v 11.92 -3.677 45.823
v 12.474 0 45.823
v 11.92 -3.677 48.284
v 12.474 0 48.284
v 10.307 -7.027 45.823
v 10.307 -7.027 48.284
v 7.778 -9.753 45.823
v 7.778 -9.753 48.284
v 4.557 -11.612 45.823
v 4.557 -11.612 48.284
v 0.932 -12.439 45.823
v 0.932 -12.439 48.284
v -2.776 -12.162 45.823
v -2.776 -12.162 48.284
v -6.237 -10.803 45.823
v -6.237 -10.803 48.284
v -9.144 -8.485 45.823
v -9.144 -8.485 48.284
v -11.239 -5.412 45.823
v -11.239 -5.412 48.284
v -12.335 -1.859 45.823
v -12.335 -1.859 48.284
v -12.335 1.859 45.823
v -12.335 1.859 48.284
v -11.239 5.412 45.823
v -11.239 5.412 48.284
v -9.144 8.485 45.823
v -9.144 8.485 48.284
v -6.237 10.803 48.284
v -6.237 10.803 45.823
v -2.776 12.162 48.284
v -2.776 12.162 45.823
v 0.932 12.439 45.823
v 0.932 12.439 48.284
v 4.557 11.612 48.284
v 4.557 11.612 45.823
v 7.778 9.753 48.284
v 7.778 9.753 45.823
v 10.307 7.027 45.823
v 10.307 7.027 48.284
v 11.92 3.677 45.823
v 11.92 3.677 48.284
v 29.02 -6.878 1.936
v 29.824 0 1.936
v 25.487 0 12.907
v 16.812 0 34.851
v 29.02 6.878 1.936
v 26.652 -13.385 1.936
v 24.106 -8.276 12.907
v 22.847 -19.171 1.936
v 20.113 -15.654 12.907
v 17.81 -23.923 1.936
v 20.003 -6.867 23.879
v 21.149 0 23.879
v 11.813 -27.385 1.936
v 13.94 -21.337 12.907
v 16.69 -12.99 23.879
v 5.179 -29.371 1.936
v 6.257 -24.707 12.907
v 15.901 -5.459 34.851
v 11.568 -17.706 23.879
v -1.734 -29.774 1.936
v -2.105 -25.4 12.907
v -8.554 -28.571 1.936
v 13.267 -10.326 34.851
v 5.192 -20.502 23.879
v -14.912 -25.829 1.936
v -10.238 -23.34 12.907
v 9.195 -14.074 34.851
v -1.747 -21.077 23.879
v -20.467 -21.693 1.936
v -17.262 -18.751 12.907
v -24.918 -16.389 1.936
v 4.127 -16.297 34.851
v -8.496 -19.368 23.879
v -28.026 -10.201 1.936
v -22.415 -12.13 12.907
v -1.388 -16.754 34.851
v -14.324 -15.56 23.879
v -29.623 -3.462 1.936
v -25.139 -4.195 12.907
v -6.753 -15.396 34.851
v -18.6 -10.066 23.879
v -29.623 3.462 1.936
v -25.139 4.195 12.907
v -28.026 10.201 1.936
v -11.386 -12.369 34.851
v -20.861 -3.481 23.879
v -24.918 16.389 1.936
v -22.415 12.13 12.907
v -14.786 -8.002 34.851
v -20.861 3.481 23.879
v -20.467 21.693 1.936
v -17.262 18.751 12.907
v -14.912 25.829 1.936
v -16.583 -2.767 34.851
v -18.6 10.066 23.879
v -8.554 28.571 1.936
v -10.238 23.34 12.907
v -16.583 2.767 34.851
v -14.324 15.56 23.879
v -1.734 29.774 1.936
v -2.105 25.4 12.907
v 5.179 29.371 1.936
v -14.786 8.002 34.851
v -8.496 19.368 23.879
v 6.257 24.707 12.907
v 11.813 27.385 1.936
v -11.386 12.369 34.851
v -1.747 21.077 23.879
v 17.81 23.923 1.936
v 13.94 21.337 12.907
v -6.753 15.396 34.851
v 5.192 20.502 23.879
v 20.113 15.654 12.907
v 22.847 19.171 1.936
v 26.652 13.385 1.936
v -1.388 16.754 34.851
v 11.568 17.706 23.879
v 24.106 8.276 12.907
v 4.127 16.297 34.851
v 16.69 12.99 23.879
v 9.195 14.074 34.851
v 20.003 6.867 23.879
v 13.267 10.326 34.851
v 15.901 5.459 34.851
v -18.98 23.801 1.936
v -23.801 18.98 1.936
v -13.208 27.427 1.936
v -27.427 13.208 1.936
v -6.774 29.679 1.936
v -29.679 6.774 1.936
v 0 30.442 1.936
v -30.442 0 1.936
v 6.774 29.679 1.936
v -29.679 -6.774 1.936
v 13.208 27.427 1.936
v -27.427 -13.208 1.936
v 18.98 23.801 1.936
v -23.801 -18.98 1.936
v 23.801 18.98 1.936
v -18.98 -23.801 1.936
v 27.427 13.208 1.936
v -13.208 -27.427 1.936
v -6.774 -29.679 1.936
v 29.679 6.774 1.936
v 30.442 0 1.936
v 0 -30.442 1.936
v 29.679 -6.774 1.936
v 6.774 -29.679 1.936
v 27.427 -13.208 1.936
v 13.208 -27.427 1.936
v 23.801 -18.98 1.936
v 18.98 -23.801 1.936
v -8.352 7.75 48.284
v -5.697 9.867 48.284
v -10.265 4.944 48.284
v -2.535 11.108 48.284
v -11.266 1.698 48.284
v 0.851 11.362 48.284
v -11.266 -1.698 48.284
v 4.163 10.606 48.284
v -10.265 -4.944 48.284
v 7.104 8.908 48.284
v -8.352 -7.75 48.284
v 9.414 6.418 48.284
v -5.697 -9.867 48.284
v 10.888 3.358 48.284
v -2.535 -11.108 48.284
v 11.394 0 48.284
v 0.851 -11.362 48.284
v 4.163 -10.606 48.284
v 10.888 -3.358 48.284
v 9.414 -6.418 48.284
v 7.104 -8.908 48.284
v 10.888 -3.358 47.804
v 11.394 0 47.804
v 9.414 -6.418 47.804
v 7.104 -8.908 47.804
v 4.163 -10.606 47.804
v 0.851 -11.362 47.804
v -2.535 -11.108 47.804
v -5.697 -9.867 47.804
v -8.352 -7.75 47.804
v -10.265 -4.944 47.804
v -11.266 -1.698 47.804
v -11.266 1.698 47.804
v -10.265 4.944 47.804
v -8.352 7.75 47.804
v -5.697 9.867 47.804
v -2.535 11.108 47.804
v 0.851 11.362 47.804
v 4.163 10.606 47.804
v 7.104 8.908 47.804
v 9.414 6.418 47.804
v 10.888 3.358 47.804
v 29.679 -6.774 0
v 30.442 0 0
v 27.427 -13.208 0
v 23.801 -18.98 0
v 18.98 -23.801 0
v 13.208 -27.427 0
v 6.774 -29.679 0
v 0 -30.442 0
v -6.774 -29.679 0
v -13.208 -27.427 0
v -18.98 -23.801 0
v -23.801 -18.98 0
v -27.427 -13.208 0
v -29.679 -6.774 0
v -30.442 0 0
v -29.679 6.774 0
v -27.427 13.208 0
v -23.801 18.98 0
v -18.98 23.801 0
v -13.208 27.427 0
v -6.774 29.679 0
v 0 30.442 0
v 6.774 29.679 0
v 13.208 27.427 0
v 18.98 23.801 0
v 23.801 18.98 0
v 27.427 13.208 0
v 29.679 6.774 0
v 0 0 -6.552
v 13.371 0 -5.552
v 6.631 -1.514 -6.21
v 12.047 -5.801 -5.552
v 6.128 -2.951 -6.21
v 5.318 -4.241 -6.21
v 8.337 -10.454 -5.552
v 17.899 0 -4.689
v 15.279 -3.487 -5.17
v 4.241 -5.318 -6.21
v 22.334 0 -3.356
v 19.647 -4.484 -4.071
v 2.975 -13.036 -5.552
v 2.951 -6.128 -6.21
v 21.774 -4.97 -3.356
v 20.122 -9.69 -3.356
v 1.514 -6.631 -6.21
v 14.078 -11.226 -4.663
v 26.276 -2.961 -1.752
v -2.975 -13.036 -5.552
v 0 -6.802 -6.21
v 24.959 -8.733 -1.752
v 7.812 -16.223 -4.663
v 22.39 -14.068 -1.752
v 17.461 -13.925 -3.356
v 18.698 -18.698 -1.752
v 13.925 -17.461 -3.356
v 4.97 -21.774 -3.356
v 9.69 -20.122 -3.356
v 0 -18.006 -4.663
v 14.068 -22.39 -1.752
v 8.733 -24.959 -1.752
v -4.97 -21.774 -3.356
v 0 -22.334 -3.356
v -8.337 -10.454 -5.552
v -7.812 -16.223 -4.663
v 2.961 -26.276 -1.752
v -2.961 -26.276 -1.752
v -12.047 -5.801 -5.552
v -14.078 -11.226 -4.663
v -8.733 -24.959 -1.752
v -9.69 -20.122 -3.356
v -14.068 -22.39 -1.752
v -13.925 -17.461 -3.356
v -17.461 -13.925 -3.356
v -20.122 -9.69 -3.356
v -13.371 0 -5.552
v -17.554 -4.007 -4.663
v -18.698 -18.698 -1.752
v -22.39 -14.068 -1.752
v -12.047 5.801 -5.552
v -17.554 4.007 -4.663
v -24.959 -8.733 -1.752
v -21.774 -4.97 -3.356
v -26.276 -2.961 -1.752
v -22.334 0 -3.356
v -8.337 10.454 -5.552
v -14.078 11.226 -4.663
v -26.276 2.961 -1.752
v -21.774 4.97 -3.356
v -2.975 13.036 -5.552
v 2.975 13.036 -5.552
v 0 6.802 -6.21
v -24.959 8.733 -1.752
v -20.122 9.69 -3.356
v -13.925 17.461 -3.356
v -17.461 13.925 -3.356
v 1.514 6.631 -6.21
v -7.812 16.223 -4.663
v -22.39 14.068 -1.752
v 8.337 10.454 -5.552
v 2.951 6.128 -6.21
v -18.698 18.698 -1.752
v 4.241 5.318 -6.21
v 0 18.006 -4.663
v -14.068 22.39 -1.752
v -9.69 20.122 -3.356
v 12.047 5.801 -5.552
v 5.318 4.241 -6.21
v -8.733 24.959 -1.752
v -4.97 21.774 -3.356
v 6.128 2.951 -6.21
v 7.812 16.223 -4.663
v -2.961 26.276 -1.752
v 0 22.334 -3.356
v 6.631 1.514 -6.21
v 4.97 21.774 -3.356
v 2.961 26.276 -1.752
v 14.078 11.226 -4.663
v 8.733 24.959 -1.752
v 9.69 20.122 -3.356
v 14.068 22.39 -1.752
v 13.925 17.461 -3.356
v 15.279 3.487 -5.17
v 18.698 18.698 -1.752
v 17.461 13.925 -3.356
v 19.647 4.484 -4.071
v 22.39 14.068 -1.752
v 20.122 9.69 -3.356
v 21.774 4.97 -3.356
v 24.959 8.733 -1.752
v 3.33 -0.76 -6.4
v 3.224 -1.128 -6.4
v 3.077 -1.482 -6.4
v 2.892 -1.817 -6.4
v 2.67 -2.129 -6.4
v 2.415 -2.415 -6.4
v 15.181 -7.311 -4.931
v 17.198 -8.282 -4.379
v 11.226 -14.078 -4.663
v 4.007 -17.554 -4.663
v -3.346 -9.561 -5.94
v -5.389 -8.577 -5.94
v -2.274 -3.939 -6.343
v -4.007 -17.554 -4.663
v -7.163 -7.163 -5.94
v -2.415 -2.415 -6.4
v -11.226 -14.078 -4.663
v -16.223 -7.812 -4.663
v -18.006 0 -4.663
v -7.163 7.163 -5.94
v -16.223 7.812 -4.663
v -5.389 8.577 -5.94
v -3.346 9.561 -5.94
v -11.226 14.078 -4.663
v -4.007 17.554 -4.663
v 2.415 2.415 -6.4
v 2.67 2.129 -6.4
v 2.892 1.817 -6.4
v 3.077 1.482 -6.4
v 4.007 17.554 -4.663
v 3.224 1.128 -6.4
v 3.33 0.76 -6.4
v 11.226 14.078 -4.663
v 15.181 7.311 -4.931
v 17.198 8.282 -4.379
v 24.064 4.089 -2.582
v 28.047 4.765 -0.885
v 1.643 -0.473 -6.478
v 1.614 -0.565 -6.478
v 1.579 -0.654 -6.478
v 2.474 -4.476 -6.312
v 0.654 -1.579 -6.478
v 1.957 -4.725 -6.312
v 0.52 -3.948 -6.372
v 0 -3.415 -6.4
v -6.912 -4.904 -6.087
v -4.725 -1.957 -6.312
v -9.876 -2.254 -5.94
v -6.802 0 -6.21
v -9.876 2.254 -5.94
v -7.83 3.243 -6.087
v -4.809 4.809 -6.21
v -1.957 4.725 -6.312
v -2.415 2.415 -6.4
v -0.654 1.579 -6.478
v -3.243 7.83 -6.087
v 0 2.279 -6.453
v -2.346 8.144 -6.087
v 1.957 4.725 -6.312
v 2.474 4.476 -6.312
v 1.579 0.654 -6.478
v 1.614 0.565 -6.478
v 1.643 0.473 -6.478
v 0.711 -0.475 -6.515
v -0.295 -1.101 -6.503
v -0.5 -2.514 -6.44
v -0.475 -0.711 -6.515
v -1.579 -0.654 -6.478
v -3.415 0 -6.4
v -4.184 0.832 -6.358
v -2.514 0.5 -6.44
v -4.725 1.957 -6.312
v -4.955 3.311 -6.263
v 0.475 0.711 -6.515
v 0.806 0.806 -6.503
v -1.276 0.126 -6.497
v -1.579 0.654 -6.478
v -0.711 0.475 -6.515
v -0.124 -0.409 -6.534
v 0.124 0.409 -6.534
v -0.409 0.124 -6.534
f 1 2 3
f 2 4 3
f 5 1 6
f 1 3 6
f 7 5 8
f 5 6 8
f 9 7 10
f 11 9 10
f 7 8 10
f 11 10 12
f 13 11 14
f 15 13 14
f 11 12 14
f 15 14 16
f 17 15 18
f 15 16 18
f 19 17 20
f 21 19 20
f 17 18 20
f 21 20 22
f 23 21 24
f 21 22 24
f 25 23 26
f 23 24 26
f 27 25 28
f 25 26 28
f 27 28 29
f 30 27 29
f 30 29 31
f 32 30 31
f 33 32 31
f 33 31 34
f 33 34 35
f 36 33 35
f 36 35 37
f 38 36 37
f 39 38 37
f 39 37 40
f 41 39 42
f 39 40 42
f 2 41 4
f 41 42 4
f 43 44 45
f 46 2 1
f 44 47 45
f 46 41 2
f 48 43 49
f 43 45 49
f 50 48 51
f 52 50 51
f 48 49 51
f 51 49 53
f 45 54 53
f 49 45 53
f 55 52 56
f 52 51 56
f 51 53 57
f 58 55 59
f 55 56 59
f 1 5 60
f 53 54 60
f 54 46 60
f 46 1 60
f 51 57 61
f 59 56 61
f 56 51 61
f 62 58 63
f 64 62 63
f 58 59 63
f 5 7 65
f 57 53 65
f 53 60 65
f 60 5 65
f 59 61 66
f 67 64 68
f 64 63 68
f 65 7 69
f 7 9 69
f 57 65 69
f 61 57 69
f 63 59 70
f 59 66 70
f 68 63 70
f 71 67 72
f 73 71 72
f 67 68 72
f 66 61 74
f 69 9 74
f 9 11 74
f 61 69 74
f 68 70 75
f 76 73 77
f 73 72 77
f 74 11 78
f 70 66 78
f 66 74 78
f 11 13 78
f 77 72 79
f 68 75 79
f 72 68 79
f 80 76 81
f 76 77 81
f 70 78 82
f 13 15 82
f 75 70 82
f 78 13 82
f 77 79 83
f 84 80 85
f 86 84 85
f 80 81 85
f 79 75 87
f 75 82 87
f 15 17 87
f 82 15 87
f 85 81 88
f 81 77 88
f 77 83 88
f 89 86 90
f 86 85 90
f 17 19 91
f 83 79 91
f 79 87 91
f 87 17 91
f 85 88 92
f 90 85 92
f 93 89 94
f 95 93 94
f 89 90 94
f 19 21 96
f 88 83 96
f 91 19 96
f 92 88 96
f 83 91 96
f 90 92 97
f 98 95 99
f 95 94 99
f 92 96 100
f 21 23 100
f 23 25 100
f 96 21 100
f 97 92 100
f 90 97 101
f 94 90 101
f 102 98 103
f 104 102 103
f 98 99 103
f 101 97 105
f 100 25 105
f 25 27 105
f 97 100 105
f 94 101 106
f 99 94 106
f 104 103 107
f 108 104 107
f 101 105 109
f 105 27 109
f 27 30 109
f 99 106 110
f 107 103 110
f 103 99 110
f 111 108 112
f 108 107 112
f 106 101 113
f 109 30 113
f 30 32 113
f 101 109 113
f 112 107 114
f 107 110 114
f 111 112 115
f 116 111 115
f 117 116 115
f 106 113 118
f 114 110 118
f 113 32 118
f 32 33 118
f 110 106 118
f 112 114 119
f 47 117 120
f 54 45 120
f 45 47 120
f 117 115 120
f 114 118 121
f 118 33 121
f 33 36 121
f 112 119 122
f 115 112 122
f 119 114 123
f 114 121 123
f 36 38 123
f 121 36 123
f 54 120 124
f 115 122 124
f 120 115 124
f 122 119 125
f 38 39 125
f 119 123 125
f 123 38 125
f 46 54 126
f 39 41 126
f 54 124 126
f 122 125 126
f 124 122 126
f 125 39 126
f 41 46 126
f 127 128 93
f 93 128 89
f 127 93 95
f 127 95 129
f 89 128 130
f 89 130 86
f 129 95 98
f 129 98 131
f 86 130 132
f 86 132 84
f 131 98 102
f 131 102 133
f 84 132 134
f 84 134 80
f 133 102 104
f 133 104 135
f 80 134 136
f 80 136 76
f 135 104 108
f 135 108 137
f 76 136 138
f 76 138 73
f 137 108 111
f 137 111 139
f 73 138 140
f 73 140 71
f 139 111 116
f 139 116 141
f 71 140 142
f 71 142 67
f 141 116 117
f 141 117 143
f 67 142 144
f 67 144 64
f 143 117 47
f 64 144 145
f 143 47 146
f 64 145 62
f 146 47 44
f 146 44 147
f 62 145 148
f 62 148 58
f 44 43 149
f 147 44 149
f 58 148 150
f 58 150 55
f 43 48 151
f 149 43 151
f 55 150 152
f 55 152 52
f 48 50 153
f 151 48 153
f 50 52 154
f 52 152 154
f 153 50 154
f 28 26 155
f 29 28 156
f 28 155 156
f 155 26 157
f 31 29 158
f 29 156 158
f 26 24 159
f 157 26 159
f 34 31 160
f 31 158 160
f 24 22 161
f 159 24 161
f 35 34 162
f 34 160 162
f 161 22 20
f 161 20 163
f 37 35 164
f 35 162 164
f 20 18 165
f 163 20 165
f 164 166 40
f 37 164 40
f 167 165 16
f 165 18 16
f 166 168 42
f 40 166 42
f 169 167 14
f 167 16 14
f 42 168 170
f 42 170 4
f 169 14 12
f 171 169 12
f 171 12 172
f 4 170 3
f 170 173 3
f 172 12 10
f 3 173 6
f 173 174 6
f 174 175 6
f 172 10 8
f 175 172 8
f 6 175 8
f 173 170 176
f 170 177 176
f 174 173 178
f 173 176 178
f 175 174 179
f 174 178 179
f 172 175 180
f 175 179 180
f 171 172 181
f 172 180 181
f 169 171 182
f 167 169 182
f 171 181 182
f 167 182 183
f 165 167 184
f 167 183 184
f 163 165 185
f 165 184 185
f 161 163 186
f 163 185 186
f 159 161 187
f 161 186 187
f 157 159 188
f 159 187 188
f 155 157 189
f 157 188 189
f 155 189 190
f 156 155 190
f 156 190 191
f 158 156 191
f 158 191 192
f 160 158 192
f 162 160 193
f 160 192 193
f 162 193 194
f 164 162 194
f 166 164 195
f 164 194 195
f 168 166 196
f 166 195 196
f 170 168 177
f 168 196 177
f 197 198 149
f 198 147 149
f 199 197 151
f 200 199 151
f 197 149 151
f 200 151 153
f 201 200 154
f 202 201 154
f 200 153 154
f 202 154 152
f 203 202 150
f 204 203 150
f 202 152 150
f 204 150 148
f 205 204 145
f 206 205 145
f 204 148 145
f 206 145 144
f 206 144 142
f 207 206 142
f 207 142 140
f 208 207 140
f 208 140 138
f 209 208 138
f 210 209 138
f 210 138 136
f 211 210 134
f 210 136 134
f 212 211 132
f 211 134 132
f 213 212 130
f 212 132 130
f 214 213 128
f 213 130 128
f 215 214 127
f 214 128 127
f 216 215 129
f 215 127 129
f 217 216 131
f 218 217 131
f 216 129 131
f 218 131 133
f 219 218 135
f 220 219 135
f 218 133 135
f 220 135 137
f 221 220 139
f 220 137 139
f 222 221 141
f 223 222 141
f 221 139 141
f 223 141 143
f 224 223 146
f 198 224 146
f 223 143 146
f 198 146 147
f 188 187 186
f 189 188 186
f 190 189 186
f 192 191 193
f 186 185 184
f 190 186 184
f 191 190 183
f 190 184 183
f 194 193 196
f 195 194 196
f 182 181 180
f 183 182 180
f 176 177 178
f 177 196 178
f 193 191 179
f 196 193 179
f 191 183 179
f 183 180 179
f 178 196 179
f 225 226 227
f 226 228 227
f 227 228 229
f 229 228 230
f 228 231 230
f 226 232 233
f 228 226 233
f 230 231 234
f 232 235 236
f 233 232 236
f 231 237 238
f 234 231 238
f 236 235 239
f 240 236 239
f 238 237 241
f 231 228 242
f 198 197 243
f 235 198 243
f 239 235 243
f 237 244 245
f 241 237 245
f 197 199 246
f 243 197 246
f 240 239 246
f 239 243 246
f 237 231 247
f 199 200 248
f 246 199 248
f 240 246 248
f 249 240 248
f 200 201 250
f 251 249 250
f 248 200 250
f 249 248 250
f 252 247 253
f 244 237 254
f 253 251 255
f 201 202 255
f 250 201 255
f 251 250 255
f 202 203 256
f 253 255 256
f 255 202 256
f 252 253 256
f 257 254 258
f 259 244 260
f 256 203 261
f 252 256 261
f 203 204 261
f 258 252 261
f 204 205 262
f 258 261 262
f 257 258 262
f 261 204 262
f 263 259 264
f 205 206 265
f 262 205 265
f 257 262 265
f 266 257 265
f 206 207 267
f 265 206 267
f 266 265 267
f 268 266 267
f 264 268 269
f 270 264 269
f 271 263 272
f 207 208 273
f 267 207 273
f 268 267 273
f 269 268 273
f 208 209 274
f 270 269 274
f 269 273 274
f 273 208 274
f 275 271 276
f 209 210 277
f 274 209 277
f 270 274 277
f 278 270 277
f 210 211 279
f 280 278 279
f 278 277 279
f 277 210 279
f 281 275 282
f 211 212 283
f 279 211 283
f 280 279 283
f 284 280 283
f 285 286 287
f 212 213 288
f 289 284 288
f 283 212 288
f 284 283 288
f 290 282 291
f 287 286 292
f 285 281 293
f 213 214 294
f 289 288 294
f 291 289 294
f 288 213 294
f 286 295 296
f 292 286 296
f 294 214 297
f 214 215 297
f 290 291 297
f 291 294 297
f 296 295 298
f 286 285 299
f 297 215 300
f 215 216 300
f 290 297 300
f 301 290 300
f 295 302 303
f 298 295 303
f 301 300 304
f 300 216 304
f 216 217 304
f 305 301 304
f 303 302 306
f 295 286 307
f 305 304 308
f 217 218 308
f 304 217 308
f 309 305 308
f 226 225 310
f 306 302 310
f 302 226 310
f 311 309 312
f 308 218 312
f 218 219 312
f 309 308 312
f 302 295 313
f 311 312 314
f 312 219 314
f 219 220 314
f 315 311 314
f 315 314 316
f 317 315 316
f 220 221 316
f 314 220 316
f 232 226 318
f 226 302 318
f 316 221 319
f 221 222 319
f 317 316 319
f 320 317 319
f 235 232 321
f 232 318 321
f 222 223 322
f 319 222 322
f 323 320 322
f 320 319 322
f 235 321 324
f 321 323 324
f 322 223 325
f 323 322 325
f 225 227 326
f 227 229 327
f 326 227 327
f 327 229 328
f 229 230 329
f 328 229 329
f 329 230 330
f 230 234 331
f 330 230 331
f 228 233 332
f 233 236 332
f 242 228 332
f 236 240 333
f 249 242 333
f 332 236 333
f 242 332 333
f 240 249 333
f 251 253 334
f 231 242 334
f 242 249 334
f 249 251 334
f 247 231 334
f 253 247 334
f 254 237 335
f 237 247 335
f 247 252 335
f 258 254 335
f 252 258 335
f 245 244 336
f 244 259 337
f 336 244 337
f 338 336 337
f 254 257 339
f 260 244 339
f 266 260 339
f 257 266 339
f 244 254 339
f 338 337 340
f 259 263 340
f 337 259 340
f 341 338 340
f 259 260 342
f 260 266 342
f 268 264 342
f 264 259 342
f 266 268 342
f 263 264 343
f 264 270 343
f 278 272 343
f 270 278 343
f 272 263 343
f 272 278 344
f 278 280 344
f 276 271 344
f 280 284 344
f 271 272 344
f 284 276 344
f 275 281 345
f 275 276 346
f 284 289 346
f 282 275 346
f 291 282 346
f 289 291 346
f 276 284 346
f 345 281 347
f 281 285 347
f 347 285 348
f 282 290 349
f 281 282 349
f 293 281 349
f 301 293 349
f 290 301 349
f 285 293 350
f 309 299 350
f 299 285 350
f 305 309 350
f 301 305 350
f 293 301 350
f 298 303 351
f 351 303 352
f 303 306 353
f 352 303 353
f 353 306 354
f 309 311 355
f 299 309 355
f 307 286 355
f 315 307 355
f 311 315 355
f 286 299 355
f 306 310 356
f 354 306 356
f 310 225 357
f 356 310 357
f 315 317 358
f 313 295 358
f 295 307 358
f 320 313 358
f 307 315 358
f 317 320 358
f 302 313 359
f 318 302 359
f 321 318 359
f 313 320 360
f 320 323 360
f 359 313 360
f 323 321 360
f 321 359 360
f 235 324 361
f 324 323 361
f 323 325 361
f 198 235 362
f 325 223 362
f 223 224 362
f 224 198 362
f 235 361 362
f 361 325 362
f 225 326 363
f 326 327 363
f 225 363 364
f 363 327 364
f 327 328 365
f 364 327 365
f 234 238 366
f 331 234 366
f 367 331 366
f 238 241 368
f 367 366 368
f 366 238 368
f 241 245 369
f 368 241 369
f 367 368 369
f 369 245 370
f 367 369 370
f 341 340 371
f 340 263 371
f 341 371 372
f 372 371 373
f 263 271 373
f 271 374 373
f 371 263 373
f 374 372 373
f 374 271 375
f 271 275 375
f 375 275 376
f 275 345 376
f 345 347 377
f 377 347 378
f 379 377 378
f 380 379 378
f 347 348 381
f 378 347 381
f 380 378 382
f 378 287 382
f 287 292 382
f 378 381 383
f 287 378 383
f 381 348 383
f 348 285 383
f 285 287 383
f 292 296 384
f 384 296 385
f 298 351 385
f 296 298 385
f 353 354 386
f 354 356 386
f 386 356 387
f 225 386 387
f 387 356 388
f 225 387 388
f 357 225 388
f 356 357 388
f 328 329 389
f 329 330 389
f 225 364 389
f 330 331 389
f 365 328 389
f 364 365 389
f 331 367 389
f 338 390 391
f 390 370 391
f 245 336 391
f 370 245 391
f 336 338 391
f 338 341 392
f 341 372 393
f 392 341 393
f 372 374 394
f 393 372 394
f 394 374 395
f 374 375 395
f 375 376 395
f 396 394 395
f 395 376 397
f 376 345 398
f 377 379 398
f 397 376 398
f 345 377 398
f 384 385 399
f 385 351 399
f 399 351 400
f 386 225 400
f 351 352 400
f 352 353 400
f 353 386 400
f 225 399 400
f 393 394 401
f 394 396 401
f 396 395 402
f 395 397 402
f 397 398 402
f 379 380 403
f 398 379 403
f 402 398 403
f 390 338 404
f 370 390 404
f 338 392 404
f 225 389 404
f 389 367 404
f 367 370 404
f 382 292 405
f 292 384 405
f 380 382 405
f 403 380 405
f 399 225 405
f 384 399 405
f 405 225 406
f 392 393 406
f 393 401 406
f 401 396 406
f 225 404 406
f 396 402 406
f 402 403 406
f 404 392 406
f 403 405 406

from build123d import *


# Not quite as in the source:
# - a feature of the source that left no trace in its solid (it failed there, or was rolled back) is left out


with BuildPart() as f1:
    # F0 (on Front) → F1 (revolve)
    with BuildSketch(Plane.XZ):
        with BuildLine():
            Line((11.3937472925, 47.8038191795), (0, 47.8038191795))
            Line((0, 47.8038191795), (0, -6.5516876057))
            add(Edge.make_bspline(
                [(0, -6.5516876057), (6.0146157822, -6.2971422391), (17.4152007991, -5.8146565414), (26.2624737662, -1.8656336954), (30.4421838373, 0)],
                knots=[0, 0, 0, 0, 0.5275708021, 1, 1, 1, 1], degree=3))
            Line((30.4421838373, 0), (30.4421838373, 1.9357798155))
            Line((30.4421838373, 1.9357798155), (29.8244003206, 1.9357798155))
            Line((29.8244003206, 1.9357798155), (12.4743720517, 45.8226278424))
            Line((12.4743720517, 45.8226278424), (12.4743720517, 48.2841059566))
            Line((12.4743720517, 48.2841059566), (11.3937472925, 48.2841059566))
            Line((11.3937472925, 48.2841059566), (11.3937472925, 47.8038191795))
        make_face()
    revolve(axis=Axis((0, 0, 20.6260657869), (0, 0, -1)))


solid = f1.part
